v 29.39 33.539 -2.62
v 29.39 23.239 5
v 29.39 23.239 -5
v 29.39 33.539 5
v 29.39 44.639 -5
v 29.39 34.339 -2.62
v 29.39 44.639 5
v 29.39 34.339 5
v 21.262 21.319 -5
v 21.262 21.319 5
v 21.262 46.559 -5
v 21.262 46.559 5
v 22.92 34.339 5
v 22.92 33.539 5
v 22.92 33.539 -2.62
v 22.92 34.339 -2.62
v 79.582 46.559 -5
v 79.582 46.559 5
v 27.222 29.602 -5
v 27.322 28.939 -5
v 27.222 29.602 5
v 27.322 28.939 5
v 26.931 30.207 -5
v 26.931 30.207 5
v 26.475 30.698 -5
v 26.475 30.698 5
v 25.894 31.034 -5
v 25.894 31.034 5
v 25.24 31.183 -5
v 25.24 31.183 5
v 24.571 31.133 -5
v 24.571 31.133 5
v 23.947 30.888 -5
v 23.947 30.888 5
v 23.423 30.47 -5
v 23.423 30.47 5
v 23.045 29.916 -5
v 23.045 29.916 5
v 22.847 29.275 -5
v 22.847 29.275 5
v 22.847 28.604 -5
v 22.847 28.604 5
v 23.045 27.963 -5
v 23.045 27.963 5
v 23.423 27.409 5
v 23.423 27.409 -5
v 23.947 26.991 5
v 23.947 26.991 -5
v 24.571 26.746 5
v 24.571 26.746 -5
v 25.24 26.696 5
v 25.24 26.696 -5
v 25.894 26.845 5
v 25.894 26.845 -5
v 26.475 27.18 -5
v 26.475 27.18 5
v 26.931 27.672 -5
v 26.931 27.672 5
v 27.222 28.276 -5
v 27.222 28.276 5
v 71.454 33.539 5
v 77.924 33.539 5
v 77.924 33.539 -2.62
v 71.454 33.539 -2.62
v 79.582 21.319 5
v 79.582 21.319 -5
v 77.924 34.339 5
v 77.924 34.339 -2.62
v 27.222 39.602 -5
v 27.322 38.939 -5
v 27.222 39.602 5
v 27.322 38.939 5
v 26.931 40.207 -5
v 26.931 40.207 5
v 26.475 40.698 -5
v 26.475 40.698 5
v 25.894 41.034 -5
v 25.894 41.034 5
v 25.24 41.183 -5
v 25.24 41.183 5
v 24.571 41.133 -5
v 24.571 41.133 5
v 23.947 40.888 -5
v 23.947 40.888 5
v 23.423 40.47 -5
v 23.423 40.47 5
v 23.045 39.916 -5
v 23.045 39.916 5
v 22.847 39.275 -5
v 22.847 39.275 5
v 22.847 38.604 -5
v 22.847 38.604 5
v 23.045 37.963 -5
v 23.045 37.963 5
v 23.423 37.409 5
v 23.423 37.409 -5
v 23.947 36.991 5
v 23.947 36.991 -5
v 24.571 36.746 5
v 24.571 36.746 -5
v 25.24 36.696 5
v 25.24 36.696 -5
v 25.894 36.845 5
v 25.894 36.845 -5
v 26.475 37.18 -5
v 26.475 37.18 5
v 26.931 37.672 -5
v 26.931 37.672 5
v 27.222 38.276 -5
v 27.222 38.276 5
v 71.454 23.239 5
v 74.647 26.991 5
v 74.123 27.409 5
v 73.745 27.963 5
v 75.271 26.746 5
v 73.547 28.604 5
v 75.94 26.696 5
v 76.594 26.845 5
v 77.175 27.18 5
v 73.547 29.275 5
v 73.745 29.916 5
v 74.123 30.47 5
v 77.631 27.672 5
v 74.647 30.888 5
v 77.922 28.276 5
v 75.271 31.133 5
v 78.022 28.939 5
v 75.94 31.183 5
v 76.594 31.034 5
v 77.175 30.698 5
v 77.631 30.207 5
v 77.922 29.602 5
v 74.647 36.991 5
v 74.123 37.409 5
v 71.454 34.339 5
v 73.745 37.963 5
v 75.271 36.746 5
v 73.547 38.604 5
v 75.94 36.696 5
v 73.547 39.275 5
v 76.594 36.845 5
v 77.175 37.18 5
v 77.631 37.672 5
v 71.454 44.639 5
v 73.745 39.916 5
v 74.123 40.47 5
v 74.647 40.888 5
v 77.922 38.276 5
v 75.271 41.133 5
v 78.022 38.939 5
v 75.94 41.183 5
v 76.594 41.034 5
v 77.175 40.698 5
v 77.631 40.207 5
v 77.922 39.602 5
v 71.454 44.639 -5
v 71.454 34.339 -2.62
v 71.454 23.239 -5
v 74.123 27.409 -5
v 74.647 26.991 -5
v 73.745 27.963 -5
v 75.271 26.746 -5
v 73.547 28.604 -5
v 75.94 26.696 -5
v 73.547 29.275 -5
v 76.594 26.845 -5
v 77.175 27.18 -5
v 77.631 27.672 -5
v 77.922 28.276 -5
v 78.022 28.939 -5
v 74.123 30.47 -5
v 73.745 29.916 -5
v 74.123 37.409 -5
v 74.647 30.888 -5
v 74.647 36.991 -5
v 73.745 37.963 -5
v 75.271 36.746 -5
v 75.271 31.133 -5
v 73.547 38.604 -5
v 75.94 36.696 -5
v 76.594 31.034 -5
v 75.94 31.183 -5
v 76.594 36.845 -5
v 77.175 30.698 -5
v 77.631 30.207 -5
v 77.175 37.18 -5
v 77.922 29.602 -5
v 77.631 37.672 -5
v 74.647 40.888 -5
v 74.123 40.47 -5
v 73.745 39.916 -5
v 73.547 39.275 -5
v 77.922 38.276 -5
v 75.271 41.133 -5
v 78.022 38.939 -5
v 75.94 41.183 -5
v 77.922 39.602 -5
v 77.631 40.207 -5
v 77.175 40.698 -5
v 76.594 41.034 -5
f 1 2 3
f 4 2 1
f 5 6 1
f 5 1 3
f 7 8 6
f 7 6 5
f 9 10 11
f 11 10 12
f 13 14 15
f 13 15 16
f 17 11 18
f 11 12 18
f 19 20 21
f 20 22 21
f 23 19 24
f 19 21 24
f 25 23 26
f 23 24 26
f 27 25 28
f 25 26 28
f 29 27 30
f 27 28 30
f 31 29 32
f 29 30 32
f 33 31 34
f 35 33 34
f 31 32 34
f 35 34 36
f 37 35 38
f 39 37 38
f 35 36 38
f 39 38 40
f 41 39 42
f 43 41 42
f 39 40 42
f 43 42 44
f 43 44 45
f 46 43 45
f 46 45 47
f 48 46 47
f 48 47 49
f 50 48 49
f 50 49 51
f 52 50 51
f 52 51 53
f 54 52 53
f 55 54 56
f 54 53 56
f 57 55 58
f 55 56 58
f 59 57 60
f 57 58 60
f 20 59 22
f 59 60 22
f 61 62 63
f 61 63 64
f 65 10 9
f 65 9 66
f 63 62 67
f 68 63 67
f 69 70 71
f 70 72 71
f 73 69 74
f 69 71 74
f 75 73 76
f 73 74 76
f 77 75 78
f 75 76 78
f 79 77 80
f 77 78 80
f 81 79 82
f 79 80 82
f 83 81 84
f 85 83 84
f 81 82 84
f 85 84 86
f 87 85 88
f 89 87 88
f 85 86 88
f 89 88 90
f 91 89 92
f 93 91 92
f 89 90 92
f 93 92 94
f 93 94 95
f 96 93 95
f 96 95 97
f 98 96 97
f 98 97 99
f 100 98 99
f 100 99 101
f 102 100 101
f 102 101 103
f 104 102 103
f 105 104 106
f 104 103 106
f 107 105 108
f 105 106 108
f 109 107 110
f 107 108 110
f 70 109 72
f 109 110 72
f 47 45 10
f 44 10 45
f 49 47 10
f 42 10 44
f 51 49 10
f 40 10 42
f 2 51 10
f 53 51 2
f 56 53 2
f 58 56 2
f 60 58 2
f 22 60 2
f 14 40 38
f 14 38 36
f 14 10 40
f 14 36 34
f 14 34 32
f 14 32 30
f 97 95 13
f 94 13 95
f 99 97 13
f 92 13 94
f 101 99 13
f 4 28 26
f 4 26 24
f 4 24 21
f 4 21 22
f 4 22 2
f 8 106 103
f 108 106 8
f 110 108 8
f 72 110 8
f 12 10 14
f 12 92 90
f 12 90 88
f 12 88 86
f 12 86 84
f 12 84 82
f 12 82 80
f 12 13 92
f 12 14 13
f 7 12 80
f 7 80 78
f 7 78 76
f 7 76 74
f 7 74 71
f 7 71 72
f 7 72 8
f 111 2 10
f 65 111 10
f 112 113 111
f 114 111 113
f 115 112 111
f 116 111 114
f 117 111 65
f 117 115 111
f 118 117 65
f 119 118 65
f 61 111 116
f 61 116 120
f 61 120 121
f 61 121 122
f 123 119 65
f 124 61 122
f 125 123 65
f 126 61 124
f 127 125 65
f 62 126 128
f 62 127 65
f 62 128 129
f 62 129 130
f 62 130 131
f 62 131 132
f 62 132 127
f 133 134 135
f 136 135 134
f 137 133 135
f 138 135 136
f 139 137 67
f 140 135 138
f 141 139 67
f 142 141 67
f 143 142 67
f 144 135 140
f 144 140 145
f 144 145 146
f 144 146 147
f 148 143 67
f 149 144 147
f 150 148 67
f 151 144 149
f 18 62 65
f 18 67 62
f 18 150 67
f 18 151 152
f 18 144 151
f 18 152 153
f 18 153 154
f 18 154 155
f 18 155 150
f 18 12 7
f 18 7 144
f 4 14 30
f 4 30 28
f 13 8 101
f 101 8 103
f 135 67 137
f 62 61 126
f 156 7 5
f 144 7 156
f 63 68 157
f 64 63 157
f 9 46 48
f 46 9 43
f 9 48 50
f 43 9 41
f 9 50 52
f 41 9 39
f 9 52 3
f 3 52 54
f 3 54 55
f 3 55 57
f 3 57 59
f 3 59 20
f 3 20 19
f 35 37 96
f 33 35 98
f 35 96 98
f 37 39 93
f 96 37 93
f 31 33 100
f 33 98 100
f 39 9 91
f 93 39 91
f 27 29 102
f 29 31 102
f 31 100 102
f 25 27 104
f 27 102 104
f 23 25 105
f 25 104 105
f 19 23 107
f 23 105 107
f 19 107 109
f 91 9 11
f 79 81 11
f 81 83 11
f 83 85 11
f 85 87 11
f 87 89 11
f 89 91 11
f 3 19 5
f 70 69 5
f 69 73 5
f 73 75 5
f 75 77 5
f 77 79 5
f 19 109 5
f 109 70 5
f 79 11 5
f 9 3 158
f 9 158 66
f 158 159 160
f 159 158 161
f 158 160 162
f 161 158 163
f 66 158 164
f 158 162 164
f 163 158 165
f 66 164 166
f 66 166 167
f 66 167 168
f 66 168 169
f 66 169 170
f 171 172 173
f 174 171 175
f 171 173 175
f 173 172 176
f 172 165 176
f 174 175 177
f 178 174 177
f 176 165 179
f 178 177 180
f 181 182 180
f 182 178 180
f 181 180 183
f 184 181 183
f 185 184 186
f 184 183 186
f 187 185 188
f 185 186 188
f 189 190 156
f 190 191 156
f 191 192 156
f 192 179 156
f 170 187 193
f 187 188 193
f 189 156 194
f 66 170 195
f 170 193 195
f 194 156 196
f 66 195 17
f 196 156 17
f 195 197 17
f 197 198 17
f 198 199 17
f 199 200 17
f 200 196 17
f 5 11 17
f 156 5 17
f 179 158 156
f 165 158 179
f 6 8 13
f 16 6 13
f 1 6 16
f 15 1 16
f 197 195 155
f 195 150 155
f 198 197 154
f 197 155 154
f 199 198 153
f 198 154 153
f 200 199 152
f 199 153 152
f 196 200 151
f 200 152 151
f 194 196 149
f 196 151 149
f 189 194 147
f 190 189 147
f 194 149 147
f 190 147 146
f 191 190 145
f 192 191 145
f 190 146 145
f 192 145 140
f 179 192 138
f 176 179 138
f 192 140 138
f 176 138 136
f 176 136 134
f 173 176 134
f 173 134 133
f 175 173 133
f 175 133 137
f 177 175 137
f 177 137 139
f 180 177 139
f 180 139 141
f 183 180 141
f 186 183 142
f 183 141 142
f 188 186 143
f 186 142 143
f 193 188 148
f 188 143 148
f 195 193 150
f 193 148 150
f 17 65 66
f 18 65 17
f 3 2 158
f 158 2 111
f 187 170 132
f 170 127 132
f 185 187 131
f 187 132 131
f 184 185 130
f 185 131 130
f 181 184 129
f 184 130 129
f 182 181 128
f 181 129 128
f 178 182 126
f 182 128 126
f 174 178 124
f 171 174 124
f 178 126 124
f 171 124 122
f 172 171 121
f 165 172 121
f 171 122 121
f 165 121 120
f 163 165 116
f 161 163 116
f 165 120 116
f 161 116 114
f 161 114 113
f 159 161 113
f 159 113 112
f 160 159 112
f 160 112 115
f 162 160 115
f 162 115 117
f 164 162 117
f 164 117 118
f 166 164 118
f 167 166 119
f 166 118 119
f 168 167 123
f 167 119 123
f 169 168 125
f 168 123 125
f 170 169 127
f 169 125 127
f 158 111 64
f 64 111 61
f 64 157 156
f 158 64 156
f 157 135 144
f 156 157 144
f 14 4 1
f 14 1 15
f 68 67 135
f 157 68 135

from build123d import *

# Parameters (mm, degrees)
SKETCH2_W               = 58.32
SKETCH2_H               = 25.24
BOSS_EXTRUDE1_DEPTH     = 5
SKETCH1_R               = 2.25
SKETCH1_R_2             = 2.250000002
SKETCH1_R_3             = 2.250018527
CUT_EXTRUDE1_DEPTH      = 6
CUT_EXTRUDE1_DEPTH_BACK = 6
SKETCH3_W               = 42.063996433
SKETCH3_H               = 21.40000003
CUT_EXTRUDE2_DEPTH      = 1
CUT_EXTRUDE2_DEPTH_BACK = 11
SKETCH4_W               = 6.47
SKETCH4_H               = 0.8
CUT_EXTRUDE3_DEPTH      = 7.62


with BuildPart() as part:
    # Sketch2 → Boss-Extrude1 (new body, symmetric)
    with BuildSketch(Plane.XY):
        with Locations((50.422024802, 33.939282453)):
            Rectangle(SKETCH2_W, SKETCH2_H)
    extrude(amount=BOSS_EXTRUDE1_DEPTH, both=True)

    # Sketch1 → Cut-Extrude1 (cut, two sides)
    with BuildSketch(Plane.XY) as cut_extrude1_sk:
        with Locations((25.072024802, 28.939282453)):
            Circle(SKETCH1_R)
        with Locations((25.072024802, 38.939282453)):
            Circle(SKETCH1_R_2)
        with Locations((75.772021235, 38.939264272)):
            Circle(SKETCH1_R_3)
        with Locations((75.772024802, 28.939282453)):
            Circle(SKETCH1_R)
    extrude(amount=CUT_EXTRUDE1_DEPTH, mode=Mode.SUBTRACT)
    extrude(cut_extrude1_sk.sketch, amount=-CUT_EXTRUDE1_DEPTH_BACK, mode=Mode.SUBTRACT)

    # Sketch3 → Cut-Extrude2 (cut, two sides)
    with BuildSketch(Plane.XY.offset(5)) as cut_extrude2_sk:
        with Locations((50.422023018, 33.939282438)):
            Rectangle(SKETCH3_W, SKETCH3_H)
    extrude(amount=CUT_EXTRUDE2_DEPTH, mode=Mode.SUBTRACT)
    extrude(cut_extrude2_sk.sketch, amount=-CUT_EXTRUDE2_DEPTH_BACK, mode=Mode.SUBTRACT)

    # Sketch4 → Cut-Extrude3 (cut)
    with BuildSketch(Plane(origin=(0, 0, 5), x_dir=(-1, 0, 0), z_dir=(0, 0, -1))):
        with Locations((-74.689021235, 33.939282453)):
            Rectangle(SKETCH4_W, SKETCH4_H)
        with Locations((-26.155024802, 33.939282453)):
            Rectangle(SKETCH4_W, SKETCH4_H)
    extrude(amount=CUT_EXTRUDE3_DEPTH, mode=Mode.SUBTRACT)


solid = part.part
